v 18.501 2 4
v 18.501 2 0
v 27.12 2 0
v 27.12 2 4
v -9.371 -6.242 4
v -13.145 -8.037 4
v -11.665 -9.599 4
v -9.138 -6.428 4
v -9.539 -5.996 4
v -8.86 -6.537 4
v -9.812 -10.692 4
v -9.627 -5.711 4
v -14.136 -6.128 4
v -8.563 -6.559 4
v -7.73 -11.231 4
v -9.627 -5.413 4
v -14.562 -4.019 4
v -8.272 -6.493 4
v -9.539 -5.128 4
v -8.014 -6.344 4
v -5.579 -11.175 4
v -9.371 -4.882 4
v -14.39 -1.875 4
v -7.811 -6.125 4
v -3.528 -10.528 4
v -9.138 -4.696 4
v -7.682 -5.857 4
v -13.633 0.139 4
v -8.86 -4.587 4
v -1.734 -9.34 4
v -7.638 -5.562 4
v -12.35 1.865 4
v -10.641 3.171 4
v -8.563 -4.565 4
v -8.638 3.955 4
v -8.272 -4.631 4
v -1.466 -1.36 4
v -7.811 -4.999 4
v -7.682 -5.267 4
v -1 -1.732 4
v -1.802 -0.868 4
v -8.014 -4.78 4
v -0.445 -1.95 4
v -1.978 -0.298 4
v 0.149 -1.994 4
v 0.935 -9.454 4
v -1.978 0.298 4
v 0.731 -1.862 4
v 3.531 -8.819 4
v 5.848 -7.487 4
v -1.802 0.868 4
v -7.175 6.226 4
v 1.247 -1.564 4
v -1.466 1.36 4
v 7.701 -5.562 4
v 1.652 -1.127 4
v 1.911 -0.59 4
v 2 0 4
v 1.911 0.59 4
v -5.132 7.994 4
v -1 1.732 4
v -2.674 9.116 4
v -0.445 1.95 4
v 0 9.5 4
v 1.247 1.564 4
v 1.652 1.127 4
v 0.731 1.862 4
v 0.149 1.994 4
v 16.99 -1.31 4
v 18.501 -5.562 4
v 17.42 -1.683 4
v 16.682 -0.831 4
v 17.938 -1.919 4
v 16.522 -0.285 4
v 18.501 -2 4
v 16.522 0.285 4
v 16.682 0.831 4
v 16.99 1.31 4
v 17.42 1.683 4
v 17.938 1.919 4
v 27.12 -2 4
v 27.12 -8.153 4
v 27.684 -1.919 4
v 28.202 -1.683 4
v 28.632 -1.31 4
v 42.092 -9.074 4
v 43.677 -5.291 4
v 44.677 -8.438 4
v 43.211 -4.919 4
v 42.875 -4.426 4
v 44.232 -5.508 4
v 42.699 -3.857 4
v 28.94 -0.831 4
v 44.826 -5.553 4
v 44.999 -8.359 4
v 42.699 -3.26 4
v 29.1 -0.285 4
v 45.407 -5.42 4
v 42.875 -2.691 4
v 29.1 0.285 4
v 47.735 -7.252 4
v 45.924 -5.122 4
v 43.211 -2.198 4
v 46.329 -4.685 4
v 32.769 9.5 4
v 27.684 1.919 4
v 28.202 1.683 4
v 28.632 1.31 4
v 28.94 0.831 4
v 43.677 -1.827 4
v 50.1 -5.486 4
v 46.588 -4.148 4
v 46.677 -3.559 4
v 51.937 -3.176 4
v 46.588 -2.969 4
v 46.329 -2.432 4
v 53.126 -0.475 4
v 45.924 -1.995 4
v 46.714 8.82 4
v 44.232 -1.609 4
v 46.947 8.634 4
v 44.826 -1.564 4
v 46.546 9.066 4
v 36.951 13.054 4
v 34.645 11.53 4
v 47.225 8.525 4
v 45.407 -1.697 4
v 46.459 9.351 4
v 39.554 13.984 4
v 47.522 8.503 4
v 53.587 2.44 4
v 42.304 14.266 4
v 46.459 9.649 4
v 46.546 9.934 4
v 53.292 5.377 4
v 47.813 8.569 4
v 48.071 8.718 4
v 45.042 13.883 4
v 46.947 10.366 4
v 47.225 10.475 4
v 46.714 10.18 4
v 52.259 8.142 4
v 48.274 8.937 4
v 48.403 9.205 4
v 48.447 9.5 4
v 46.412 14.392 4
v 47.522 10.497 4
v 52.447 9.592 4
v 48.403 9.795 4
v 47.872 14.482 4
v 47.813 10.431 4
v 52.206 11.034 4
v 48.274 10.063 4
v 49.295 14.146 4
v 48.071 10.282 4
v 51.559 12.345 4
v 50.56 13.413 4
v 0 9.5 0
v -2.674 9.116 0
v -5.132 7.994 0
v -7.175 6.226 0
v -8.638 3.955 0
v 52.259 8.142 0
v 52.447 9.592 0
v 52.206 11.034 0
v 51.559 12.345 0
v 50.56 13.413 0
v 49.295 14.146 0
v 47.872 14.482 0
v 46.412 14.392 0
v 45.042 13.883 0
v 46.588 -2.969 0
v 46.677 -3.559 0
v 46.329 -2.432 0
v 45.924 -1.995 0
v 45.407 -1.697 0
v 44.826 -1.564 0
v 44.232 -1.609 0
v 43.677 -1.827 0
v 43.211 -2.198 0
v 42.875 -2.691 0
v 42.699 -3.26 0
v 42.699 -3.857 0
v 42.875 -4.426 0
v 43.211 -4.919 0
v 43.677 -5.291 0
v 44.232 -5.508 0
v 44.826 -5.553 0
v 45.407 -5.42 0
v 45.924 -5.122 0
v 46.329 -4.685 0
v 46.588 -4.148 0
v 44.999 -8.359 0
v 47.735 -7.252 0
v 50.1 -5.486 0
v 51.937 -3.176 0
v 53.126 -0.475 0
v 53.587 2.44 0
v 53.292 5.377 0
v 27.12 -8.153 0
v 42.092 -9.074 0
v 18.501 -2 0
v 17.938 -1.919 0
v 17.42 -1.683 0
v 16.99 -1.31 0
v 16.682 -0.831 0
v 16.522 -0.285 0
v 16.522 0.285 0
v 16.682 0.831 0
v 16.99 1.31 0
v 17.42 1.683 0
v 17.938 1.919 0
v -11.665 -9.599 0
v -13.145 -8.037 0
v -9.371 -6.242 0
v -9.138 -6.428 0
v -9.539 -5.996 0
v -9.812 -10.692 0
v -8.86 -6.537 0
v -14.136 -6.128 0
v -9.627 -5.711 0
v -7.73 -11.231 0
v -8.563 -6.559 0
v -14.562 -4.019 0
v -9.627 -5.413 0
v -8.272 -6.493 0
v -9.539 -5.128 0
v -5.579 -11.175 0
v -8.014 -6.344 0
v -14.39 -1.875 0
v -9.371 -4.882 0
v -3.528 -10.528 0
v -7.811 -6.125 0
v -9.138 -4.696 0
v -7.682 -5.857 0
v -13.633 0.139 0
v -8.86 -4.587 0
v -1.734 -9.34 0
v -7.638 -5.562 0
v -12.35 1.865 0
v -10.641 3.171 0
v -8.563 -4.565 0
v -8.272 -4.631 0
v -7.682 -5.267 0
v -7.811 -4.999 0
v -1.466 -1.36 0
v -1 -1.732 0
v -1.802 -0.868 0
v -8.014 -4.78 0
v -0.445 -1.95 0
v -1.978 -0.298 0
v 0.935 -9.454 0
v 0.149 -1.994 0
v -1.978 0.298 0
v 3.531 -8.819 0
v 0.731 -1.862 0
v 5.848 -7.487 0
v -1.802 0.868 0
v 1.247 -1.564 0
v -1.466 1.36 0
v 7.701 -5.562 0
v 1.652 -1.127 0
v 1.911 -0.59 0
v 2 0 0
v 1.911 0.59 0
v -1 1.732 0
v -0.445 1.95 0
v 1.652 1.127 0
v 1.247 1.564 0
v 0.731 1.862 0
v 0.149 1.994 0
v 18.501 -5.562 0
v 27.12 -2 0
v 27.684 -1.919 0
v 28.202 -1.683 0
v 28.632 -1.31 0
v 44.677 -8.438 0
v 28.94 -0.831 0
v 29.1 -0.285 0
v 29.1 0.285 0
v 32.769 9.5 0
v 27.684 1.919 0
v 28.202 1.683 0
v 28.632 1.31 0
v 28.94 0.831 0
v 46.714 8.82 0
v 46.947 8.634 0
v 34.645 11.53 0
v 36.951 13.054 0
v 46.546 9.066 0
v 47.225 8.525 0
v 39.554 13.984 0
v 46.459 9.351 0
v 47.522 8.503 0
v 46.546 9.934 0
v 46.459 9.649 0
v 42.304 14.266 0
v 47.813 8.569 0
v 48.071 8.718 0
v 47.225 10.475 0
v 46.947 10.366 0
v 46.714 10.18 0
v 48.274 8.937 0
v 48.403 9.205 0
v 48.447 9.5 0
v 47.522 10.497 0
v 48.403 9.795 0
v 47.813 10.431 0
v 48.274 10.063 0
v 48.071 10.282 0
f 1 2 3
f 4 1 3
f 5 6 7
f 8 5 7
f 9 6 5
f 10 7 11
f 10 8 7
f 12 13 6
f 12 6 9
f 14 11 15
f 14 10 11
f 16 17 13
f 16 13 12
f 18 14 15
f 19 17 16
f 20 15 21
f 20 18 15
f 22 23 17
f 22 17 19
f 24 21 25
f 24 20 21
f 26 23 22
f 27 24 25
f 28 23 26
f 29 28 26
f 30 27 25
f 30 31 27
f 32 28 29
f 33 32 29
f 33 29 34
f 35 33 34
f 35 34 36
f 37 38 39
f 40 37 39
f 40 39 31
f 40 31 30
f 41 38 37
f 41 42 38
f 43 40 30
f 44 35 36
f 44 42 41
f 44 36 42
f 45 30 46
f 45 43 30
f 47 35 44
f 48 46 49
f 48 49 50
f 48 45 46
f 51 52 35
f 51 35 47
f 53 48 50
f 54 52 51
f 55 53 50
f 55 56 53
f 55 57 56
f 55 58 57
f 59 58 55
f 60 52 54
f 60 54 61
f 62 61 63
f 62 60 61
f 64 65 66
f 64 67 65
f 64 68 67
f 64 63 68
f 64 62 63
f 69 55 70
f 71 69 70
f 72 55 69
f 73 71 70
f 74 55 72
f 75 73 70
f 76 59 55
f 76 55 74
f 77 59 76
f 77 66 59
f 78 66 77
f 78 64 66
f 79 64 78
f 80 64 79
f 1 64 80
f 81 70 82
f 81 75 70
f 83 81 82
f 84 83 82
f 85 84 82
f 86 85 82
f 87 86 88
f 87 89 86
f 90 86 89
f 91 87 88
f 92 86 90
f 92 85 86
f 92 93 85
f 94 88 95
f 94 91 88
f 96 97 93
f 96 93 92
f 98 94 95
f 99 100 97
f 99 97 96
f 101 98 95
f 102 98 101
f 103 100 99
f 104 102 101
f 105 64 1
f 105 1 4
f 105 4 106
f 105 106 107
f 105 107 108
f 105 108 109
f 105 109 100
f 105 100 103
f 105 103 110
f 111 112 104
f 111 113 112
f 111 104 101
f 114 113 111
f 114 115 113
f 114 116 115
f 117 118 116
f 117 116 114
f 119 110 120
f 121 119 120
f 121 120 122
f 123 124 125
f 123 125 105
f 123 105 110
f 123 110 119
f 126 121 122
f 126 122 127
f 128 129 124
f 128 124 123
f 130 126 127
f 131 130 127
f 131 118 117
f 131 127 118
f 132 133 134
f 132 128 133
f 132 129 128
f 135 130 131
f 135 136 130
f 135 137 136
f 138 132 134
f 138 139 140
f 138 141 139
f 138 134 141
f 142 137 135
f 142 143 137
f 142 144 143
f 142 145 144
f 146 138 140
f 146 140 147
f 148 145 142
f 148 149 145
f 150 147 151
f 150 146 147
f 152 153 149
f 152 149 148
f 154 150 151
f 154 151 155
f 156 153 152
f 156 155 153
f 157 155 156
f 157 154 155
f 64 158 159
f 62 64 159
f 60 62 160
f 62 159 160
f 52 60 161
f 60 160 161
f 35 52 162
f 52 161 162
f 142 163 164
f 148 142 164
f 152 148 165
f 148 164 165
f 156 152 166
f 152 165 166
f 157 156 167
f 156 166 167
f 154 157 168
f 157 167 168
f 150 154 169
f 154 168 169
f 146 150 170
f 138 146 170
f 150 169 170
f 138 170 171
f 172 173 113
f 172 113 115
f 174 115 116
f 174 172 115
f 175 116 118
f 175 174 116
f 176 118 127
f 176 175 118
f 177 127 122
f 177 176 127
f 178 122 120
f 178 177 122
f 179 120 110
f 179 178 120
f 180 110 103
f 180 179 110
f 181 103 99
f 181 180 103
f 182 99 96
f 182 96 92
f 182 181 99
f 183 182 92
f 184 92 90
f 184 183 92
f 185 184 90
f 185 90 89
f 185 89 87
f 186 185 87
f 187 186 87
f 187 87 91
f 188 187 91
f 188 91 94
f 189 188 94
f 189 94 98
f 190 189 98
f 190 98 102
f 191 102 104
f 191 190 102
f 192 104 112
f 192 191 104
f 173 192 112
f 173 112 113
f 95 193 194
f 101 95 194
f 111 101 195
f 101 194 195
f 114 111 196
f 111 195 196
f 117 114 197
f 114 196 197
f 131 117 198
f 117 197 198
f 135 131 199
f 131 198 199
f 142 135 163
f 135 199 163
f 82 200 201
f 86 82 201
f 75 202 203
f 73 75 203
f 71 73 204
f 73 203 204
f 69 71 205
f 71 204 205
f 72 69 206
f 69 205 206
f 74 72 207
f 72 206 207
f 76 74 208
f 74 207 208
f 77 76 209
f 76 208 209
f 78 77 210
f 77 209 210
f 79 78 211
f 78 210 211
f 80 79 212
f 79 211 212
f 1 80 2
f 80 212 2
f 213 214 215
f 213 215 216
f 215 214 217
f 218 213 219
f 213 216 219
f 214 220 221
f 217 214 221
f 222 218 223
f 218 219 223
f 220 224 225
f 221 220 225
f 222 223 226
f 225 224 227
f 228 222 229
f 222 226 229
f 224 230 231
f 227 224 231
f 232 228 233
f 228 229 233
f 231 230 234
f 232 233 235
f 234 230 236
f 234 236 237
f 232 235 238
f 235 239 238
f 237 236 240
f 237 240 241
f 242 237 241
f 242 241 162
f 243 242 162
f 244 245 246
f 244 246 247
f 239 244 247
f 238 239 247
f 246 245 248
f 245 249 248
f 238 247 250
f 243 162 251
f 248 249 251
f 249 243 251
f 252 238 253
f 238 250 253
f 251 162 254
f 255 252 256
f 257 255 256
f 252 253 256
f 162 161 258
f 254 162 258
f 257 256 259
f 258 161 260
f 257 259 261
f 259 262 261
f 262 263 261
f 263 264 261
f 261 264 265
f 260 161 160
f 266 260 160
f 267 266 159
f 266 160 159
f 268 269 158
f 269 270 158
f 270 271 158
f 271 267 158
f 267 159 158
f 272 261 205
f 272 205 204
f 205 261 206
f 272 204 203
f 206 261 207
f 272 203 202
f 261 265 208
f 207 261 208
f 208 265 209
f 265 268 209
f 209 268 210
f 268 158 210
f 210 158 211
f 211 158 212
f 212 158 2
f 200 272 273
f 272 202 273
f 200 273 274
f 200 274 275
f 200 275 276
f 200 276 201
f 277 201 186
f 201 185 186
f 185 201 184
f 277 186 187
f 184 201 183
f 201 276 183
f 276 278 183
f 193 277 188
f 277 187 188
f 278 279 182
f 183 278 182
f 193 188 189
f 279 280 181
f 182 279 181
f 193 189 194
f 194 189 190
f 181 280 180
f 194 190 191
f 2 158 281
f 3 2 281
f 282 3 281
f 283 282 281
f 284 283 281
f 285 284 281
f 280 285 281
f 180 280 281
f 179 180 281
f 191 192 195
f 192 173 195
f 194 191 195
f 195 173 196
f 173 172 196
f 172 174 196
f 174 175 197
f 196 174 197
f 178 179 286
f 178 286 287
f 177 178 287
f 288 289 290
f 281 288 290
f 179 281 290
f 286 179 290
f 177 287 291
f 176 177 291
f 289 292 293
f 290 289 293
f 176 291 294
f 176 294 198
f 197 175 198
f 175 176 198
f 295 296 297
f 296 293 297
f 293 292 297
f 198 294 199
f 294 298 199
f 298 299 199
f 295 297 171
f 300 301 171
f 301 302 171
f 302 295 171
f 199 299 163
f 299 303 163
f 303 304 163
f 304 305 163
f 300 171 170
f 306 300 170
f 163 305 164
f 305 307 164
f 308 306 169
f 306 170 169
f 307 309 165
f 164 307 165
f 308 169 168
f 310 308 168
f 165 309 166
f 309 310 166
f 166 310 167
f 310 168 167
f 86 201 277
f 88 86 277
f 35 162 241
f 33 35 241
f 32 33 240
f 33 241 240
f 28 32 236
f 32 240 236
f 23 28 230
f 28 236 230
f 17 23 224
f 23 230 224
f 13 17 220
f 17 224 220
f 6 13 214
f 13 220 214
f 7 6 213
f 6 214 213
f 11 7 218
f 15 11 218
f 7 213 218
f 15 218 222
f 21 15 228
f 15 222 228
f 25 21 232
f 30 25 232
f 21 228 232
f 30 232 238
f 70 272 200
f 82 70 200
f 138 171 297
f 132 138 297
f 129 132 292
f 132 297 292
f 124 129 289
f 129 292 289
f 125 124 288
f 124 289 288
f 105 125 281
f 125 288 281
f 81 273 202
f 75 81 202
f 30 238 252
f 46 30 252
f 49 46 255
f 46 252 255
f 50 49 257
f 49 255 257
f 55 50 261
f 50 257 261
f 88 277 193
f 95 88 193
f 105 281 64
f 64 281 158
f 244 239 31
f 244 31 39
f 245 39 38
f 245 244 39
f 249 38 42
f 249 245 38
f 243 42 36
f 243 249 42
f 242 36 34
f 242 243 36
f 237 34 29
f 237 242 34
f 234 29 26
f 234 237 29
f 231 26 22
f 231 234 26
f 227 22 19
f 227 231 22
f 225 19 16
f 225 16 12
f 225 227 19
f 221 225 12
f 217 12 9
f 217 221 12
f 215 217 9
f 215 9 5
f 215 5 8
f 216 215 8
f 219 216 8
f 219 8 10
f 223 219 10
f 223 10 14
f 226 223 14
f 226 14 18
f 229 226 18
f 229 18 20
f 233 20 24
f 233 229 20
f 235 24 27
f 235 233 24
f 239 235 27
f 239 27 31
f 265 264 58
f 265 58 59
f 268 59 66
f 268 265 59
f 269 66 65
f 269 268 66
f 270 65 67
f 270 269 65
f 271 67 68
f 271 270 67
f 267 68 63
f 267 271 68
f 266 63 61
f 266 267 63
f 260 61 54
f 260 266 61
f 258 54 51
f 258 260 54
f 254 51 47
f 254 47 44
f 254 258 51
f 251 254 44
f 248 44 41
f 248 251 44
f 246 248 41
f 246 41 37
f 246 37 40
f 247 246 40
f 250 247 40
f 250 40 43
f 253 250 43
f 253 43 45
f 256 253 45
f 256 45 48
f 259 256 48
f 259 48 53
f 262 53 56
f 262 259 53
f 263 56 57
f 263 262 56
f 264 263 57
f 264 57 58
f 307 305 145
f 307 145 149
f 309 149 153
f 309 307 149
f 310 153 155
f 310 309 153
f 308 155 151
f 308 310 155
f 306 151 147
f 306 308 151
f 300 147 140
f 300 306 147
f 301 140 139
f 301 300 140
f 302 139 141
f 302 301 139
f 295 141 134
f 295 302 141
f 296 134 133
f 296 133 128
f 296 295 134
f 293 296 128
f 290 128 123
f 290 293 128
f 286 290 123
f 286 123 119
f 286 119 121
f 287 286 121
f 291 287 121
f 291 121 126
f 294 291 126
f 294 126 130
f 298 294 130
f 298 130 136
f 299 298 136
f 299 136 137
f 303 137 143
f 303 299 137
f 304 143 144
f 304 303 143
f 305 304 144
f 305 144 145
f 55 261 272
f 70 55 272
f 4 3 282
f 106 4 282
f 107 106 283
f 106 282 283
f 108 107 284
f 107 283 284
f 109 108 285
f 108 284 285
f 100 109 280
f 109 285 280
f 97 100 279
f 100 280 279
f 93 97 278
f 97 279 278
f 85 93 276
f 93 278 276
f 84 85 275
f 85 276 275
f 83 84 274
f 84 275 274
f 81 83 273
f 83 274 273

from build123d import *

# Parameters (mm, degrees)
SKETCH1_R           = 1
SKETCH1_R_2         = 2
BOSS_EXTRUDE1_DEPTH = 4


with BuildPart() as part:
    # Sketch1 → Boss-Extrude1 (new body)
    with BuildSketch(Plane.XY):
        with BuildLine():
            Line((32.768661414, 9.5), (0, 9.5))
            ThreePointArc((0, 9.5), (-5.132216198, 7.994395343), (-8.637676899, 3.954811978))
            ThreePointArc((-8.637676899, 3.954811978), (-13.707021242, -7.117107183), (-1.734430481, -9.340329272))
            ThreePointArc((-1.734430481, -9.340329272), (3.531285703, -8.819298231), (7.70145267, -5.562160262))
            Line((7.70145267, -5.562160262), (18.50145267, -5.562160262))
            Line((18.50145267, -5.562160262), (27.120384516, -8.153301675))
            Line((27.120384516, -8.153301675), (42.092126283, -9.073599712))
            Line((42.092126283, -9.073599712), (44.676644991, -8.438049901))
            Line((44.676644991, -8.438049901), (44.999262596, -8.358716152))
            ThreePointArc((44.999262596, -8.358716152), (52.618268655, -1.863685843), (52.259320622, 8.141604176))
            ThreePointArc((52.259320622, 8.141604176), (50.560022951, 13.41298626), (45.041503714, 13.883121423))
            ThreePointArc((45.041503714, 13.883121423), (38.224286315, 13.597806101), (32.768661414, 9.5))
        make_face()
        with Locations((-8.637676899, -5.562160262)):
            Circle(SKETCH1_R, mode=Mode.SUBTRACT)
        Circle(SKETCH1_R_2, mode=Mode.SUBTRACT)
        with BuildLine():
            ThreePointArc((18.50145267, -2), (16.50145267, 0), (18.50145267, 2))
            Line((18.50145267, 2), (27.120384516, 2))
            ThreePointArc((27.120384516, 2), (29.120384516, 0), (27.120384516, -2))
            Line((27.120384516, -2), (18.50145267, -2))
        make_face(mode=Mode.SUBTRACT)
        with Locations((44.676644991, -3.558553592)):
            Circle(SKETCH1_R_2, mode=Mode.SUBTRACT)
        with Locations((47.447381223, 9.5)):
            Circle(SKETCH1_R, mode=Mode.SUBTRACT)
    extrude(amount=BOSS_EXTRUDE1_DEPTH)


solid = part.part
